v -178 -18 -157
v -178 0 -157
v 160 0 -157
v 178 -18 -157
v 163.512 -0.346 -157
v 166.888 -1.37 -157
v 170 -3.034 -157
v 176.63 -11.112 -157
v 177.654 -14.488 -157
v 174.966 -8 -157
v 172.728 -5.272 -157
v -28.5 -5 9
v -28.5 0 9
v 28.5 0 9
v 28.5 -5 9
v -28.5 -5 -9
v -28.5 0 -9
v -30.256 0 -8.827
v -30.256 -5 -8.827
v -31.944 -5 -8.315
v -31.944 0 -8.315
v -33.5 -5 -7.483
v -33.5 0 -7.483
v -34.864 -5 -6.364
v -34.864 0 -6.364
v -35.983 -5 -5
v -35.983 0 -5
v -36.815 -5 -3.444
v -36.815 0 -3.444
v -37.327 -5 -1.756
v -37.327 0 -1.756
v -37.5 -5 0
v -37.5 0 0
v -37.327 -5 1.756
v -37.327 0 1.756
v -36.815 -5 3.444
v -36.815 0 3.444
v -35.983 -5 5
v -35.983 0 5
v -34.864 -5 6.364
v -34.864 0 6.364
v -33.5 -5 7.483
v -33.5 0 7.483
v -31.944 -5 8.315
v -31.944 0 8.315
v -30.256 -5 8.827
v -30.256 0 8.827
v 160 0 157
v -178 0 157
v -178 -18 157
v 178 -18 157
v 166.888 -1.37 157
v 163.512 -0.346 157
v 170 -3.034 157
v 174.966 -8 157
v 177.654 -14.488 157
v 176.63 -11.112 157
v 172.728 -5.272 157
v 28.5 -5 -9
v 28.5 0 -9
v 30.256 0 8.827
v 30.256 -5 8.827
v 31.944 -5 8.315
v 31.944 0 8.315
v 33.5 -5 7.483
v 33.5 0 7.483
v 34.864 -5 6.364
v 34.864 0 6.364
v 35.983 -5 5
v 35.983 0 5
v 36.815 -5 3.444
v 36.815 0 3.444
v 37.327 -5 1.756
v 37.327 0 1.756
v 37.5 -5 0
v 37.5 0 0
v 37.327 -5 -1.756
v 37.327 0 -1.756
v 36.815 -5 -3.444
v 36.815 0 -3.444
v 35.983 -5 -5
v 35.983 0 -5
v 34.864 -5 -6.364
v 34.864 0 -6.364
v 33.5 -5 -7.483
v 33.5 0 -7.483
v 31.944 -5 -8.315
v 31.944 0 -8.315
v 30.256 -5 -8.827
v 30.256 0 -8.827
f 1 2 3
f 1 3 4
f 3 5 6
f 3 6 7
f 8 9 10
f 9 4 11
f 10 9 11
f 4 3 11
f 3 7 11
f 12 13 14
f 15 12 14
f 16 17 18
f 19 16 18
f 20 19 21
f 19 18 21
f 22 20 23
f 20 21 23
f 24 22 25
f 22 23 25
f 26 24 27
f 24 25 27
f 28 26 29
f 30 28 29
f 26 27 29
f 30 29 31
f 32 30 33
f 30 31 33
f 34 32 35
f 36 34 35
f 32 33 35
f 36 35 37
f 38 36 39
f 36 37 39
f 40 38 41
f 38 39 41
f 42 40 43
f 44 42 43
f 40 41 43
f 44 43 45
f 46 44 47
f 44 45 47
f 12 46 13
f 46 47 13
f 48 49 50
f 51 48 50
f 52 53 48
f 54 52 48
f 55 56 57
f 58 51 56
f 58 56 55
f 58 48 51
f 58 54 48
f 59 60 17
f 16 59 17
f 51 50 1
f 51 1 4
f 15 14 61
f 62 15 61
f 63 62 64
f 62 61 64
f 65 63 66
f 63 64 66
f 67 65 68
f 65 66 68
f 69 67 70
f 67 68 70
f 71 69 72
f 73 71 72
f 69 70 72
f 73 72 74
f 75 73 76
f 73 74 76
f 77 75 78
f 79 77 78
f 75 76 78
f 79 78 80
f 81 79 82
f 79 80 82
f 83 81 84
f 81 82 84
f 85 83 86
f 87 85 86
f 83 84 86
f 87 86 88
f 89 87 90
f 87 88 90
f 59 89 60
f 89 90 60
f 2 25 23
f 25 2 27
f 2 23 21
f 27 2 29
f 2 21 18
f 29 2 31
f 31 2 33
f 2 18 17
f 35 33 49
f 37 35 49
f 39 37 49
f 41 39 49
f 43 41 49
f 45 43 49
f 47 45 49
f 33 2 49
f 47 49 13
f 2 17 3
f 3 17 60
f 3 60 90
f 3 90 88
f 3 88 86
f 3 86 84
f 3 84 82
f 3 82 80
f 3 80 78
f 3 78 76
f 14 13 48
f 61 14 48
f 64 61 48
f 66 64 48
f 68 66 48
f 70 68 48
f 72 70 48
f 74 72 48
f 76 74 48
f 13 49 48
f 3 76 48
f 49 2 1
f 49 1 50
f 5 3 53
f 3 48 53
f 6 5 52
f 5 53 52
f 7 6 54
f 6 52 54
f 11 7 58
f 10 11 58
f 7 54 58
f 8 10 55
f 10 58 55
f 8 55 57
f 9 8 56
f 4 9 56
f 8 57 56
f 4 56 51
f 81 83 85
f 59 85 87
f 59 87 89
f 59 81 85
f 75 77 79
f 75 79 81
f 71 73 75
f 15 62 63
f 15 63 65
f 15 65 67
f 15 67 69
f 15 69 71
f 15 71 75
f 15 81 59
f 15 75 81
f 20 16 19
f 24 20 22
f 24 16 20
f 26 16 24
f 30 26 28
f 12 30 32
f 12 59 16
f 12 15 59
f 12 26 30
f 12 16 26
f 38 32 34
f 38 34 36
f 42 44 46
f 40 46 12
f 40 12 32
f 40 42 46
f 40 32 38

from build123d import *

# Parameters (mm, degrees)
F0_W     = 356
F0_H     = 314
F1_DEPTH = 18
F3_DEPTH = 5
F4_R     = 17.99999


# Not quite as in the source:
# - a fillet or chamfer is up to 0.001 mm smaller than in the source, because OpenCascade refuses the exact size


with BuildPart() as f1:
    # F0 (on Front) → F1 (new body)
    with BuildSketch(Plane.XZ):
        Rectangle(F0_W, F0_H)
    extrude(amount=F1_DEPTH)

    # F2 (on face) → F3 (cut)
    with BuildSketch(Plane(origin=(0, 0, 0), x_dir=(-1, 0, 0), z_dir=(0, 1, 0))):
        with BuildLine():
            ThreePointArc((28.5, -9), (37.5, 0), (28.5, 9))
            Line((28.5, 9), (-28.5, 9))
            ThreePointArc((-28.5, 9), (-37.5, 0), (-28.5, -9))
            Line((-28.5, -9), (28.5, -9))
        make_face()
    extrude(amount=-F3_DEPTH, mode=Mode.SUBTRACT)

    # F4 (radius 18 in the source; OpenCascade refuses exactly that, so slightly less here)
    f4_edges = [f1.edges().sort_by_distance(p)[0] for p in [
        (178, 0, 0),
    ]]
    fillet(f4_edges, radius=F4_R)


solid = f1.part
